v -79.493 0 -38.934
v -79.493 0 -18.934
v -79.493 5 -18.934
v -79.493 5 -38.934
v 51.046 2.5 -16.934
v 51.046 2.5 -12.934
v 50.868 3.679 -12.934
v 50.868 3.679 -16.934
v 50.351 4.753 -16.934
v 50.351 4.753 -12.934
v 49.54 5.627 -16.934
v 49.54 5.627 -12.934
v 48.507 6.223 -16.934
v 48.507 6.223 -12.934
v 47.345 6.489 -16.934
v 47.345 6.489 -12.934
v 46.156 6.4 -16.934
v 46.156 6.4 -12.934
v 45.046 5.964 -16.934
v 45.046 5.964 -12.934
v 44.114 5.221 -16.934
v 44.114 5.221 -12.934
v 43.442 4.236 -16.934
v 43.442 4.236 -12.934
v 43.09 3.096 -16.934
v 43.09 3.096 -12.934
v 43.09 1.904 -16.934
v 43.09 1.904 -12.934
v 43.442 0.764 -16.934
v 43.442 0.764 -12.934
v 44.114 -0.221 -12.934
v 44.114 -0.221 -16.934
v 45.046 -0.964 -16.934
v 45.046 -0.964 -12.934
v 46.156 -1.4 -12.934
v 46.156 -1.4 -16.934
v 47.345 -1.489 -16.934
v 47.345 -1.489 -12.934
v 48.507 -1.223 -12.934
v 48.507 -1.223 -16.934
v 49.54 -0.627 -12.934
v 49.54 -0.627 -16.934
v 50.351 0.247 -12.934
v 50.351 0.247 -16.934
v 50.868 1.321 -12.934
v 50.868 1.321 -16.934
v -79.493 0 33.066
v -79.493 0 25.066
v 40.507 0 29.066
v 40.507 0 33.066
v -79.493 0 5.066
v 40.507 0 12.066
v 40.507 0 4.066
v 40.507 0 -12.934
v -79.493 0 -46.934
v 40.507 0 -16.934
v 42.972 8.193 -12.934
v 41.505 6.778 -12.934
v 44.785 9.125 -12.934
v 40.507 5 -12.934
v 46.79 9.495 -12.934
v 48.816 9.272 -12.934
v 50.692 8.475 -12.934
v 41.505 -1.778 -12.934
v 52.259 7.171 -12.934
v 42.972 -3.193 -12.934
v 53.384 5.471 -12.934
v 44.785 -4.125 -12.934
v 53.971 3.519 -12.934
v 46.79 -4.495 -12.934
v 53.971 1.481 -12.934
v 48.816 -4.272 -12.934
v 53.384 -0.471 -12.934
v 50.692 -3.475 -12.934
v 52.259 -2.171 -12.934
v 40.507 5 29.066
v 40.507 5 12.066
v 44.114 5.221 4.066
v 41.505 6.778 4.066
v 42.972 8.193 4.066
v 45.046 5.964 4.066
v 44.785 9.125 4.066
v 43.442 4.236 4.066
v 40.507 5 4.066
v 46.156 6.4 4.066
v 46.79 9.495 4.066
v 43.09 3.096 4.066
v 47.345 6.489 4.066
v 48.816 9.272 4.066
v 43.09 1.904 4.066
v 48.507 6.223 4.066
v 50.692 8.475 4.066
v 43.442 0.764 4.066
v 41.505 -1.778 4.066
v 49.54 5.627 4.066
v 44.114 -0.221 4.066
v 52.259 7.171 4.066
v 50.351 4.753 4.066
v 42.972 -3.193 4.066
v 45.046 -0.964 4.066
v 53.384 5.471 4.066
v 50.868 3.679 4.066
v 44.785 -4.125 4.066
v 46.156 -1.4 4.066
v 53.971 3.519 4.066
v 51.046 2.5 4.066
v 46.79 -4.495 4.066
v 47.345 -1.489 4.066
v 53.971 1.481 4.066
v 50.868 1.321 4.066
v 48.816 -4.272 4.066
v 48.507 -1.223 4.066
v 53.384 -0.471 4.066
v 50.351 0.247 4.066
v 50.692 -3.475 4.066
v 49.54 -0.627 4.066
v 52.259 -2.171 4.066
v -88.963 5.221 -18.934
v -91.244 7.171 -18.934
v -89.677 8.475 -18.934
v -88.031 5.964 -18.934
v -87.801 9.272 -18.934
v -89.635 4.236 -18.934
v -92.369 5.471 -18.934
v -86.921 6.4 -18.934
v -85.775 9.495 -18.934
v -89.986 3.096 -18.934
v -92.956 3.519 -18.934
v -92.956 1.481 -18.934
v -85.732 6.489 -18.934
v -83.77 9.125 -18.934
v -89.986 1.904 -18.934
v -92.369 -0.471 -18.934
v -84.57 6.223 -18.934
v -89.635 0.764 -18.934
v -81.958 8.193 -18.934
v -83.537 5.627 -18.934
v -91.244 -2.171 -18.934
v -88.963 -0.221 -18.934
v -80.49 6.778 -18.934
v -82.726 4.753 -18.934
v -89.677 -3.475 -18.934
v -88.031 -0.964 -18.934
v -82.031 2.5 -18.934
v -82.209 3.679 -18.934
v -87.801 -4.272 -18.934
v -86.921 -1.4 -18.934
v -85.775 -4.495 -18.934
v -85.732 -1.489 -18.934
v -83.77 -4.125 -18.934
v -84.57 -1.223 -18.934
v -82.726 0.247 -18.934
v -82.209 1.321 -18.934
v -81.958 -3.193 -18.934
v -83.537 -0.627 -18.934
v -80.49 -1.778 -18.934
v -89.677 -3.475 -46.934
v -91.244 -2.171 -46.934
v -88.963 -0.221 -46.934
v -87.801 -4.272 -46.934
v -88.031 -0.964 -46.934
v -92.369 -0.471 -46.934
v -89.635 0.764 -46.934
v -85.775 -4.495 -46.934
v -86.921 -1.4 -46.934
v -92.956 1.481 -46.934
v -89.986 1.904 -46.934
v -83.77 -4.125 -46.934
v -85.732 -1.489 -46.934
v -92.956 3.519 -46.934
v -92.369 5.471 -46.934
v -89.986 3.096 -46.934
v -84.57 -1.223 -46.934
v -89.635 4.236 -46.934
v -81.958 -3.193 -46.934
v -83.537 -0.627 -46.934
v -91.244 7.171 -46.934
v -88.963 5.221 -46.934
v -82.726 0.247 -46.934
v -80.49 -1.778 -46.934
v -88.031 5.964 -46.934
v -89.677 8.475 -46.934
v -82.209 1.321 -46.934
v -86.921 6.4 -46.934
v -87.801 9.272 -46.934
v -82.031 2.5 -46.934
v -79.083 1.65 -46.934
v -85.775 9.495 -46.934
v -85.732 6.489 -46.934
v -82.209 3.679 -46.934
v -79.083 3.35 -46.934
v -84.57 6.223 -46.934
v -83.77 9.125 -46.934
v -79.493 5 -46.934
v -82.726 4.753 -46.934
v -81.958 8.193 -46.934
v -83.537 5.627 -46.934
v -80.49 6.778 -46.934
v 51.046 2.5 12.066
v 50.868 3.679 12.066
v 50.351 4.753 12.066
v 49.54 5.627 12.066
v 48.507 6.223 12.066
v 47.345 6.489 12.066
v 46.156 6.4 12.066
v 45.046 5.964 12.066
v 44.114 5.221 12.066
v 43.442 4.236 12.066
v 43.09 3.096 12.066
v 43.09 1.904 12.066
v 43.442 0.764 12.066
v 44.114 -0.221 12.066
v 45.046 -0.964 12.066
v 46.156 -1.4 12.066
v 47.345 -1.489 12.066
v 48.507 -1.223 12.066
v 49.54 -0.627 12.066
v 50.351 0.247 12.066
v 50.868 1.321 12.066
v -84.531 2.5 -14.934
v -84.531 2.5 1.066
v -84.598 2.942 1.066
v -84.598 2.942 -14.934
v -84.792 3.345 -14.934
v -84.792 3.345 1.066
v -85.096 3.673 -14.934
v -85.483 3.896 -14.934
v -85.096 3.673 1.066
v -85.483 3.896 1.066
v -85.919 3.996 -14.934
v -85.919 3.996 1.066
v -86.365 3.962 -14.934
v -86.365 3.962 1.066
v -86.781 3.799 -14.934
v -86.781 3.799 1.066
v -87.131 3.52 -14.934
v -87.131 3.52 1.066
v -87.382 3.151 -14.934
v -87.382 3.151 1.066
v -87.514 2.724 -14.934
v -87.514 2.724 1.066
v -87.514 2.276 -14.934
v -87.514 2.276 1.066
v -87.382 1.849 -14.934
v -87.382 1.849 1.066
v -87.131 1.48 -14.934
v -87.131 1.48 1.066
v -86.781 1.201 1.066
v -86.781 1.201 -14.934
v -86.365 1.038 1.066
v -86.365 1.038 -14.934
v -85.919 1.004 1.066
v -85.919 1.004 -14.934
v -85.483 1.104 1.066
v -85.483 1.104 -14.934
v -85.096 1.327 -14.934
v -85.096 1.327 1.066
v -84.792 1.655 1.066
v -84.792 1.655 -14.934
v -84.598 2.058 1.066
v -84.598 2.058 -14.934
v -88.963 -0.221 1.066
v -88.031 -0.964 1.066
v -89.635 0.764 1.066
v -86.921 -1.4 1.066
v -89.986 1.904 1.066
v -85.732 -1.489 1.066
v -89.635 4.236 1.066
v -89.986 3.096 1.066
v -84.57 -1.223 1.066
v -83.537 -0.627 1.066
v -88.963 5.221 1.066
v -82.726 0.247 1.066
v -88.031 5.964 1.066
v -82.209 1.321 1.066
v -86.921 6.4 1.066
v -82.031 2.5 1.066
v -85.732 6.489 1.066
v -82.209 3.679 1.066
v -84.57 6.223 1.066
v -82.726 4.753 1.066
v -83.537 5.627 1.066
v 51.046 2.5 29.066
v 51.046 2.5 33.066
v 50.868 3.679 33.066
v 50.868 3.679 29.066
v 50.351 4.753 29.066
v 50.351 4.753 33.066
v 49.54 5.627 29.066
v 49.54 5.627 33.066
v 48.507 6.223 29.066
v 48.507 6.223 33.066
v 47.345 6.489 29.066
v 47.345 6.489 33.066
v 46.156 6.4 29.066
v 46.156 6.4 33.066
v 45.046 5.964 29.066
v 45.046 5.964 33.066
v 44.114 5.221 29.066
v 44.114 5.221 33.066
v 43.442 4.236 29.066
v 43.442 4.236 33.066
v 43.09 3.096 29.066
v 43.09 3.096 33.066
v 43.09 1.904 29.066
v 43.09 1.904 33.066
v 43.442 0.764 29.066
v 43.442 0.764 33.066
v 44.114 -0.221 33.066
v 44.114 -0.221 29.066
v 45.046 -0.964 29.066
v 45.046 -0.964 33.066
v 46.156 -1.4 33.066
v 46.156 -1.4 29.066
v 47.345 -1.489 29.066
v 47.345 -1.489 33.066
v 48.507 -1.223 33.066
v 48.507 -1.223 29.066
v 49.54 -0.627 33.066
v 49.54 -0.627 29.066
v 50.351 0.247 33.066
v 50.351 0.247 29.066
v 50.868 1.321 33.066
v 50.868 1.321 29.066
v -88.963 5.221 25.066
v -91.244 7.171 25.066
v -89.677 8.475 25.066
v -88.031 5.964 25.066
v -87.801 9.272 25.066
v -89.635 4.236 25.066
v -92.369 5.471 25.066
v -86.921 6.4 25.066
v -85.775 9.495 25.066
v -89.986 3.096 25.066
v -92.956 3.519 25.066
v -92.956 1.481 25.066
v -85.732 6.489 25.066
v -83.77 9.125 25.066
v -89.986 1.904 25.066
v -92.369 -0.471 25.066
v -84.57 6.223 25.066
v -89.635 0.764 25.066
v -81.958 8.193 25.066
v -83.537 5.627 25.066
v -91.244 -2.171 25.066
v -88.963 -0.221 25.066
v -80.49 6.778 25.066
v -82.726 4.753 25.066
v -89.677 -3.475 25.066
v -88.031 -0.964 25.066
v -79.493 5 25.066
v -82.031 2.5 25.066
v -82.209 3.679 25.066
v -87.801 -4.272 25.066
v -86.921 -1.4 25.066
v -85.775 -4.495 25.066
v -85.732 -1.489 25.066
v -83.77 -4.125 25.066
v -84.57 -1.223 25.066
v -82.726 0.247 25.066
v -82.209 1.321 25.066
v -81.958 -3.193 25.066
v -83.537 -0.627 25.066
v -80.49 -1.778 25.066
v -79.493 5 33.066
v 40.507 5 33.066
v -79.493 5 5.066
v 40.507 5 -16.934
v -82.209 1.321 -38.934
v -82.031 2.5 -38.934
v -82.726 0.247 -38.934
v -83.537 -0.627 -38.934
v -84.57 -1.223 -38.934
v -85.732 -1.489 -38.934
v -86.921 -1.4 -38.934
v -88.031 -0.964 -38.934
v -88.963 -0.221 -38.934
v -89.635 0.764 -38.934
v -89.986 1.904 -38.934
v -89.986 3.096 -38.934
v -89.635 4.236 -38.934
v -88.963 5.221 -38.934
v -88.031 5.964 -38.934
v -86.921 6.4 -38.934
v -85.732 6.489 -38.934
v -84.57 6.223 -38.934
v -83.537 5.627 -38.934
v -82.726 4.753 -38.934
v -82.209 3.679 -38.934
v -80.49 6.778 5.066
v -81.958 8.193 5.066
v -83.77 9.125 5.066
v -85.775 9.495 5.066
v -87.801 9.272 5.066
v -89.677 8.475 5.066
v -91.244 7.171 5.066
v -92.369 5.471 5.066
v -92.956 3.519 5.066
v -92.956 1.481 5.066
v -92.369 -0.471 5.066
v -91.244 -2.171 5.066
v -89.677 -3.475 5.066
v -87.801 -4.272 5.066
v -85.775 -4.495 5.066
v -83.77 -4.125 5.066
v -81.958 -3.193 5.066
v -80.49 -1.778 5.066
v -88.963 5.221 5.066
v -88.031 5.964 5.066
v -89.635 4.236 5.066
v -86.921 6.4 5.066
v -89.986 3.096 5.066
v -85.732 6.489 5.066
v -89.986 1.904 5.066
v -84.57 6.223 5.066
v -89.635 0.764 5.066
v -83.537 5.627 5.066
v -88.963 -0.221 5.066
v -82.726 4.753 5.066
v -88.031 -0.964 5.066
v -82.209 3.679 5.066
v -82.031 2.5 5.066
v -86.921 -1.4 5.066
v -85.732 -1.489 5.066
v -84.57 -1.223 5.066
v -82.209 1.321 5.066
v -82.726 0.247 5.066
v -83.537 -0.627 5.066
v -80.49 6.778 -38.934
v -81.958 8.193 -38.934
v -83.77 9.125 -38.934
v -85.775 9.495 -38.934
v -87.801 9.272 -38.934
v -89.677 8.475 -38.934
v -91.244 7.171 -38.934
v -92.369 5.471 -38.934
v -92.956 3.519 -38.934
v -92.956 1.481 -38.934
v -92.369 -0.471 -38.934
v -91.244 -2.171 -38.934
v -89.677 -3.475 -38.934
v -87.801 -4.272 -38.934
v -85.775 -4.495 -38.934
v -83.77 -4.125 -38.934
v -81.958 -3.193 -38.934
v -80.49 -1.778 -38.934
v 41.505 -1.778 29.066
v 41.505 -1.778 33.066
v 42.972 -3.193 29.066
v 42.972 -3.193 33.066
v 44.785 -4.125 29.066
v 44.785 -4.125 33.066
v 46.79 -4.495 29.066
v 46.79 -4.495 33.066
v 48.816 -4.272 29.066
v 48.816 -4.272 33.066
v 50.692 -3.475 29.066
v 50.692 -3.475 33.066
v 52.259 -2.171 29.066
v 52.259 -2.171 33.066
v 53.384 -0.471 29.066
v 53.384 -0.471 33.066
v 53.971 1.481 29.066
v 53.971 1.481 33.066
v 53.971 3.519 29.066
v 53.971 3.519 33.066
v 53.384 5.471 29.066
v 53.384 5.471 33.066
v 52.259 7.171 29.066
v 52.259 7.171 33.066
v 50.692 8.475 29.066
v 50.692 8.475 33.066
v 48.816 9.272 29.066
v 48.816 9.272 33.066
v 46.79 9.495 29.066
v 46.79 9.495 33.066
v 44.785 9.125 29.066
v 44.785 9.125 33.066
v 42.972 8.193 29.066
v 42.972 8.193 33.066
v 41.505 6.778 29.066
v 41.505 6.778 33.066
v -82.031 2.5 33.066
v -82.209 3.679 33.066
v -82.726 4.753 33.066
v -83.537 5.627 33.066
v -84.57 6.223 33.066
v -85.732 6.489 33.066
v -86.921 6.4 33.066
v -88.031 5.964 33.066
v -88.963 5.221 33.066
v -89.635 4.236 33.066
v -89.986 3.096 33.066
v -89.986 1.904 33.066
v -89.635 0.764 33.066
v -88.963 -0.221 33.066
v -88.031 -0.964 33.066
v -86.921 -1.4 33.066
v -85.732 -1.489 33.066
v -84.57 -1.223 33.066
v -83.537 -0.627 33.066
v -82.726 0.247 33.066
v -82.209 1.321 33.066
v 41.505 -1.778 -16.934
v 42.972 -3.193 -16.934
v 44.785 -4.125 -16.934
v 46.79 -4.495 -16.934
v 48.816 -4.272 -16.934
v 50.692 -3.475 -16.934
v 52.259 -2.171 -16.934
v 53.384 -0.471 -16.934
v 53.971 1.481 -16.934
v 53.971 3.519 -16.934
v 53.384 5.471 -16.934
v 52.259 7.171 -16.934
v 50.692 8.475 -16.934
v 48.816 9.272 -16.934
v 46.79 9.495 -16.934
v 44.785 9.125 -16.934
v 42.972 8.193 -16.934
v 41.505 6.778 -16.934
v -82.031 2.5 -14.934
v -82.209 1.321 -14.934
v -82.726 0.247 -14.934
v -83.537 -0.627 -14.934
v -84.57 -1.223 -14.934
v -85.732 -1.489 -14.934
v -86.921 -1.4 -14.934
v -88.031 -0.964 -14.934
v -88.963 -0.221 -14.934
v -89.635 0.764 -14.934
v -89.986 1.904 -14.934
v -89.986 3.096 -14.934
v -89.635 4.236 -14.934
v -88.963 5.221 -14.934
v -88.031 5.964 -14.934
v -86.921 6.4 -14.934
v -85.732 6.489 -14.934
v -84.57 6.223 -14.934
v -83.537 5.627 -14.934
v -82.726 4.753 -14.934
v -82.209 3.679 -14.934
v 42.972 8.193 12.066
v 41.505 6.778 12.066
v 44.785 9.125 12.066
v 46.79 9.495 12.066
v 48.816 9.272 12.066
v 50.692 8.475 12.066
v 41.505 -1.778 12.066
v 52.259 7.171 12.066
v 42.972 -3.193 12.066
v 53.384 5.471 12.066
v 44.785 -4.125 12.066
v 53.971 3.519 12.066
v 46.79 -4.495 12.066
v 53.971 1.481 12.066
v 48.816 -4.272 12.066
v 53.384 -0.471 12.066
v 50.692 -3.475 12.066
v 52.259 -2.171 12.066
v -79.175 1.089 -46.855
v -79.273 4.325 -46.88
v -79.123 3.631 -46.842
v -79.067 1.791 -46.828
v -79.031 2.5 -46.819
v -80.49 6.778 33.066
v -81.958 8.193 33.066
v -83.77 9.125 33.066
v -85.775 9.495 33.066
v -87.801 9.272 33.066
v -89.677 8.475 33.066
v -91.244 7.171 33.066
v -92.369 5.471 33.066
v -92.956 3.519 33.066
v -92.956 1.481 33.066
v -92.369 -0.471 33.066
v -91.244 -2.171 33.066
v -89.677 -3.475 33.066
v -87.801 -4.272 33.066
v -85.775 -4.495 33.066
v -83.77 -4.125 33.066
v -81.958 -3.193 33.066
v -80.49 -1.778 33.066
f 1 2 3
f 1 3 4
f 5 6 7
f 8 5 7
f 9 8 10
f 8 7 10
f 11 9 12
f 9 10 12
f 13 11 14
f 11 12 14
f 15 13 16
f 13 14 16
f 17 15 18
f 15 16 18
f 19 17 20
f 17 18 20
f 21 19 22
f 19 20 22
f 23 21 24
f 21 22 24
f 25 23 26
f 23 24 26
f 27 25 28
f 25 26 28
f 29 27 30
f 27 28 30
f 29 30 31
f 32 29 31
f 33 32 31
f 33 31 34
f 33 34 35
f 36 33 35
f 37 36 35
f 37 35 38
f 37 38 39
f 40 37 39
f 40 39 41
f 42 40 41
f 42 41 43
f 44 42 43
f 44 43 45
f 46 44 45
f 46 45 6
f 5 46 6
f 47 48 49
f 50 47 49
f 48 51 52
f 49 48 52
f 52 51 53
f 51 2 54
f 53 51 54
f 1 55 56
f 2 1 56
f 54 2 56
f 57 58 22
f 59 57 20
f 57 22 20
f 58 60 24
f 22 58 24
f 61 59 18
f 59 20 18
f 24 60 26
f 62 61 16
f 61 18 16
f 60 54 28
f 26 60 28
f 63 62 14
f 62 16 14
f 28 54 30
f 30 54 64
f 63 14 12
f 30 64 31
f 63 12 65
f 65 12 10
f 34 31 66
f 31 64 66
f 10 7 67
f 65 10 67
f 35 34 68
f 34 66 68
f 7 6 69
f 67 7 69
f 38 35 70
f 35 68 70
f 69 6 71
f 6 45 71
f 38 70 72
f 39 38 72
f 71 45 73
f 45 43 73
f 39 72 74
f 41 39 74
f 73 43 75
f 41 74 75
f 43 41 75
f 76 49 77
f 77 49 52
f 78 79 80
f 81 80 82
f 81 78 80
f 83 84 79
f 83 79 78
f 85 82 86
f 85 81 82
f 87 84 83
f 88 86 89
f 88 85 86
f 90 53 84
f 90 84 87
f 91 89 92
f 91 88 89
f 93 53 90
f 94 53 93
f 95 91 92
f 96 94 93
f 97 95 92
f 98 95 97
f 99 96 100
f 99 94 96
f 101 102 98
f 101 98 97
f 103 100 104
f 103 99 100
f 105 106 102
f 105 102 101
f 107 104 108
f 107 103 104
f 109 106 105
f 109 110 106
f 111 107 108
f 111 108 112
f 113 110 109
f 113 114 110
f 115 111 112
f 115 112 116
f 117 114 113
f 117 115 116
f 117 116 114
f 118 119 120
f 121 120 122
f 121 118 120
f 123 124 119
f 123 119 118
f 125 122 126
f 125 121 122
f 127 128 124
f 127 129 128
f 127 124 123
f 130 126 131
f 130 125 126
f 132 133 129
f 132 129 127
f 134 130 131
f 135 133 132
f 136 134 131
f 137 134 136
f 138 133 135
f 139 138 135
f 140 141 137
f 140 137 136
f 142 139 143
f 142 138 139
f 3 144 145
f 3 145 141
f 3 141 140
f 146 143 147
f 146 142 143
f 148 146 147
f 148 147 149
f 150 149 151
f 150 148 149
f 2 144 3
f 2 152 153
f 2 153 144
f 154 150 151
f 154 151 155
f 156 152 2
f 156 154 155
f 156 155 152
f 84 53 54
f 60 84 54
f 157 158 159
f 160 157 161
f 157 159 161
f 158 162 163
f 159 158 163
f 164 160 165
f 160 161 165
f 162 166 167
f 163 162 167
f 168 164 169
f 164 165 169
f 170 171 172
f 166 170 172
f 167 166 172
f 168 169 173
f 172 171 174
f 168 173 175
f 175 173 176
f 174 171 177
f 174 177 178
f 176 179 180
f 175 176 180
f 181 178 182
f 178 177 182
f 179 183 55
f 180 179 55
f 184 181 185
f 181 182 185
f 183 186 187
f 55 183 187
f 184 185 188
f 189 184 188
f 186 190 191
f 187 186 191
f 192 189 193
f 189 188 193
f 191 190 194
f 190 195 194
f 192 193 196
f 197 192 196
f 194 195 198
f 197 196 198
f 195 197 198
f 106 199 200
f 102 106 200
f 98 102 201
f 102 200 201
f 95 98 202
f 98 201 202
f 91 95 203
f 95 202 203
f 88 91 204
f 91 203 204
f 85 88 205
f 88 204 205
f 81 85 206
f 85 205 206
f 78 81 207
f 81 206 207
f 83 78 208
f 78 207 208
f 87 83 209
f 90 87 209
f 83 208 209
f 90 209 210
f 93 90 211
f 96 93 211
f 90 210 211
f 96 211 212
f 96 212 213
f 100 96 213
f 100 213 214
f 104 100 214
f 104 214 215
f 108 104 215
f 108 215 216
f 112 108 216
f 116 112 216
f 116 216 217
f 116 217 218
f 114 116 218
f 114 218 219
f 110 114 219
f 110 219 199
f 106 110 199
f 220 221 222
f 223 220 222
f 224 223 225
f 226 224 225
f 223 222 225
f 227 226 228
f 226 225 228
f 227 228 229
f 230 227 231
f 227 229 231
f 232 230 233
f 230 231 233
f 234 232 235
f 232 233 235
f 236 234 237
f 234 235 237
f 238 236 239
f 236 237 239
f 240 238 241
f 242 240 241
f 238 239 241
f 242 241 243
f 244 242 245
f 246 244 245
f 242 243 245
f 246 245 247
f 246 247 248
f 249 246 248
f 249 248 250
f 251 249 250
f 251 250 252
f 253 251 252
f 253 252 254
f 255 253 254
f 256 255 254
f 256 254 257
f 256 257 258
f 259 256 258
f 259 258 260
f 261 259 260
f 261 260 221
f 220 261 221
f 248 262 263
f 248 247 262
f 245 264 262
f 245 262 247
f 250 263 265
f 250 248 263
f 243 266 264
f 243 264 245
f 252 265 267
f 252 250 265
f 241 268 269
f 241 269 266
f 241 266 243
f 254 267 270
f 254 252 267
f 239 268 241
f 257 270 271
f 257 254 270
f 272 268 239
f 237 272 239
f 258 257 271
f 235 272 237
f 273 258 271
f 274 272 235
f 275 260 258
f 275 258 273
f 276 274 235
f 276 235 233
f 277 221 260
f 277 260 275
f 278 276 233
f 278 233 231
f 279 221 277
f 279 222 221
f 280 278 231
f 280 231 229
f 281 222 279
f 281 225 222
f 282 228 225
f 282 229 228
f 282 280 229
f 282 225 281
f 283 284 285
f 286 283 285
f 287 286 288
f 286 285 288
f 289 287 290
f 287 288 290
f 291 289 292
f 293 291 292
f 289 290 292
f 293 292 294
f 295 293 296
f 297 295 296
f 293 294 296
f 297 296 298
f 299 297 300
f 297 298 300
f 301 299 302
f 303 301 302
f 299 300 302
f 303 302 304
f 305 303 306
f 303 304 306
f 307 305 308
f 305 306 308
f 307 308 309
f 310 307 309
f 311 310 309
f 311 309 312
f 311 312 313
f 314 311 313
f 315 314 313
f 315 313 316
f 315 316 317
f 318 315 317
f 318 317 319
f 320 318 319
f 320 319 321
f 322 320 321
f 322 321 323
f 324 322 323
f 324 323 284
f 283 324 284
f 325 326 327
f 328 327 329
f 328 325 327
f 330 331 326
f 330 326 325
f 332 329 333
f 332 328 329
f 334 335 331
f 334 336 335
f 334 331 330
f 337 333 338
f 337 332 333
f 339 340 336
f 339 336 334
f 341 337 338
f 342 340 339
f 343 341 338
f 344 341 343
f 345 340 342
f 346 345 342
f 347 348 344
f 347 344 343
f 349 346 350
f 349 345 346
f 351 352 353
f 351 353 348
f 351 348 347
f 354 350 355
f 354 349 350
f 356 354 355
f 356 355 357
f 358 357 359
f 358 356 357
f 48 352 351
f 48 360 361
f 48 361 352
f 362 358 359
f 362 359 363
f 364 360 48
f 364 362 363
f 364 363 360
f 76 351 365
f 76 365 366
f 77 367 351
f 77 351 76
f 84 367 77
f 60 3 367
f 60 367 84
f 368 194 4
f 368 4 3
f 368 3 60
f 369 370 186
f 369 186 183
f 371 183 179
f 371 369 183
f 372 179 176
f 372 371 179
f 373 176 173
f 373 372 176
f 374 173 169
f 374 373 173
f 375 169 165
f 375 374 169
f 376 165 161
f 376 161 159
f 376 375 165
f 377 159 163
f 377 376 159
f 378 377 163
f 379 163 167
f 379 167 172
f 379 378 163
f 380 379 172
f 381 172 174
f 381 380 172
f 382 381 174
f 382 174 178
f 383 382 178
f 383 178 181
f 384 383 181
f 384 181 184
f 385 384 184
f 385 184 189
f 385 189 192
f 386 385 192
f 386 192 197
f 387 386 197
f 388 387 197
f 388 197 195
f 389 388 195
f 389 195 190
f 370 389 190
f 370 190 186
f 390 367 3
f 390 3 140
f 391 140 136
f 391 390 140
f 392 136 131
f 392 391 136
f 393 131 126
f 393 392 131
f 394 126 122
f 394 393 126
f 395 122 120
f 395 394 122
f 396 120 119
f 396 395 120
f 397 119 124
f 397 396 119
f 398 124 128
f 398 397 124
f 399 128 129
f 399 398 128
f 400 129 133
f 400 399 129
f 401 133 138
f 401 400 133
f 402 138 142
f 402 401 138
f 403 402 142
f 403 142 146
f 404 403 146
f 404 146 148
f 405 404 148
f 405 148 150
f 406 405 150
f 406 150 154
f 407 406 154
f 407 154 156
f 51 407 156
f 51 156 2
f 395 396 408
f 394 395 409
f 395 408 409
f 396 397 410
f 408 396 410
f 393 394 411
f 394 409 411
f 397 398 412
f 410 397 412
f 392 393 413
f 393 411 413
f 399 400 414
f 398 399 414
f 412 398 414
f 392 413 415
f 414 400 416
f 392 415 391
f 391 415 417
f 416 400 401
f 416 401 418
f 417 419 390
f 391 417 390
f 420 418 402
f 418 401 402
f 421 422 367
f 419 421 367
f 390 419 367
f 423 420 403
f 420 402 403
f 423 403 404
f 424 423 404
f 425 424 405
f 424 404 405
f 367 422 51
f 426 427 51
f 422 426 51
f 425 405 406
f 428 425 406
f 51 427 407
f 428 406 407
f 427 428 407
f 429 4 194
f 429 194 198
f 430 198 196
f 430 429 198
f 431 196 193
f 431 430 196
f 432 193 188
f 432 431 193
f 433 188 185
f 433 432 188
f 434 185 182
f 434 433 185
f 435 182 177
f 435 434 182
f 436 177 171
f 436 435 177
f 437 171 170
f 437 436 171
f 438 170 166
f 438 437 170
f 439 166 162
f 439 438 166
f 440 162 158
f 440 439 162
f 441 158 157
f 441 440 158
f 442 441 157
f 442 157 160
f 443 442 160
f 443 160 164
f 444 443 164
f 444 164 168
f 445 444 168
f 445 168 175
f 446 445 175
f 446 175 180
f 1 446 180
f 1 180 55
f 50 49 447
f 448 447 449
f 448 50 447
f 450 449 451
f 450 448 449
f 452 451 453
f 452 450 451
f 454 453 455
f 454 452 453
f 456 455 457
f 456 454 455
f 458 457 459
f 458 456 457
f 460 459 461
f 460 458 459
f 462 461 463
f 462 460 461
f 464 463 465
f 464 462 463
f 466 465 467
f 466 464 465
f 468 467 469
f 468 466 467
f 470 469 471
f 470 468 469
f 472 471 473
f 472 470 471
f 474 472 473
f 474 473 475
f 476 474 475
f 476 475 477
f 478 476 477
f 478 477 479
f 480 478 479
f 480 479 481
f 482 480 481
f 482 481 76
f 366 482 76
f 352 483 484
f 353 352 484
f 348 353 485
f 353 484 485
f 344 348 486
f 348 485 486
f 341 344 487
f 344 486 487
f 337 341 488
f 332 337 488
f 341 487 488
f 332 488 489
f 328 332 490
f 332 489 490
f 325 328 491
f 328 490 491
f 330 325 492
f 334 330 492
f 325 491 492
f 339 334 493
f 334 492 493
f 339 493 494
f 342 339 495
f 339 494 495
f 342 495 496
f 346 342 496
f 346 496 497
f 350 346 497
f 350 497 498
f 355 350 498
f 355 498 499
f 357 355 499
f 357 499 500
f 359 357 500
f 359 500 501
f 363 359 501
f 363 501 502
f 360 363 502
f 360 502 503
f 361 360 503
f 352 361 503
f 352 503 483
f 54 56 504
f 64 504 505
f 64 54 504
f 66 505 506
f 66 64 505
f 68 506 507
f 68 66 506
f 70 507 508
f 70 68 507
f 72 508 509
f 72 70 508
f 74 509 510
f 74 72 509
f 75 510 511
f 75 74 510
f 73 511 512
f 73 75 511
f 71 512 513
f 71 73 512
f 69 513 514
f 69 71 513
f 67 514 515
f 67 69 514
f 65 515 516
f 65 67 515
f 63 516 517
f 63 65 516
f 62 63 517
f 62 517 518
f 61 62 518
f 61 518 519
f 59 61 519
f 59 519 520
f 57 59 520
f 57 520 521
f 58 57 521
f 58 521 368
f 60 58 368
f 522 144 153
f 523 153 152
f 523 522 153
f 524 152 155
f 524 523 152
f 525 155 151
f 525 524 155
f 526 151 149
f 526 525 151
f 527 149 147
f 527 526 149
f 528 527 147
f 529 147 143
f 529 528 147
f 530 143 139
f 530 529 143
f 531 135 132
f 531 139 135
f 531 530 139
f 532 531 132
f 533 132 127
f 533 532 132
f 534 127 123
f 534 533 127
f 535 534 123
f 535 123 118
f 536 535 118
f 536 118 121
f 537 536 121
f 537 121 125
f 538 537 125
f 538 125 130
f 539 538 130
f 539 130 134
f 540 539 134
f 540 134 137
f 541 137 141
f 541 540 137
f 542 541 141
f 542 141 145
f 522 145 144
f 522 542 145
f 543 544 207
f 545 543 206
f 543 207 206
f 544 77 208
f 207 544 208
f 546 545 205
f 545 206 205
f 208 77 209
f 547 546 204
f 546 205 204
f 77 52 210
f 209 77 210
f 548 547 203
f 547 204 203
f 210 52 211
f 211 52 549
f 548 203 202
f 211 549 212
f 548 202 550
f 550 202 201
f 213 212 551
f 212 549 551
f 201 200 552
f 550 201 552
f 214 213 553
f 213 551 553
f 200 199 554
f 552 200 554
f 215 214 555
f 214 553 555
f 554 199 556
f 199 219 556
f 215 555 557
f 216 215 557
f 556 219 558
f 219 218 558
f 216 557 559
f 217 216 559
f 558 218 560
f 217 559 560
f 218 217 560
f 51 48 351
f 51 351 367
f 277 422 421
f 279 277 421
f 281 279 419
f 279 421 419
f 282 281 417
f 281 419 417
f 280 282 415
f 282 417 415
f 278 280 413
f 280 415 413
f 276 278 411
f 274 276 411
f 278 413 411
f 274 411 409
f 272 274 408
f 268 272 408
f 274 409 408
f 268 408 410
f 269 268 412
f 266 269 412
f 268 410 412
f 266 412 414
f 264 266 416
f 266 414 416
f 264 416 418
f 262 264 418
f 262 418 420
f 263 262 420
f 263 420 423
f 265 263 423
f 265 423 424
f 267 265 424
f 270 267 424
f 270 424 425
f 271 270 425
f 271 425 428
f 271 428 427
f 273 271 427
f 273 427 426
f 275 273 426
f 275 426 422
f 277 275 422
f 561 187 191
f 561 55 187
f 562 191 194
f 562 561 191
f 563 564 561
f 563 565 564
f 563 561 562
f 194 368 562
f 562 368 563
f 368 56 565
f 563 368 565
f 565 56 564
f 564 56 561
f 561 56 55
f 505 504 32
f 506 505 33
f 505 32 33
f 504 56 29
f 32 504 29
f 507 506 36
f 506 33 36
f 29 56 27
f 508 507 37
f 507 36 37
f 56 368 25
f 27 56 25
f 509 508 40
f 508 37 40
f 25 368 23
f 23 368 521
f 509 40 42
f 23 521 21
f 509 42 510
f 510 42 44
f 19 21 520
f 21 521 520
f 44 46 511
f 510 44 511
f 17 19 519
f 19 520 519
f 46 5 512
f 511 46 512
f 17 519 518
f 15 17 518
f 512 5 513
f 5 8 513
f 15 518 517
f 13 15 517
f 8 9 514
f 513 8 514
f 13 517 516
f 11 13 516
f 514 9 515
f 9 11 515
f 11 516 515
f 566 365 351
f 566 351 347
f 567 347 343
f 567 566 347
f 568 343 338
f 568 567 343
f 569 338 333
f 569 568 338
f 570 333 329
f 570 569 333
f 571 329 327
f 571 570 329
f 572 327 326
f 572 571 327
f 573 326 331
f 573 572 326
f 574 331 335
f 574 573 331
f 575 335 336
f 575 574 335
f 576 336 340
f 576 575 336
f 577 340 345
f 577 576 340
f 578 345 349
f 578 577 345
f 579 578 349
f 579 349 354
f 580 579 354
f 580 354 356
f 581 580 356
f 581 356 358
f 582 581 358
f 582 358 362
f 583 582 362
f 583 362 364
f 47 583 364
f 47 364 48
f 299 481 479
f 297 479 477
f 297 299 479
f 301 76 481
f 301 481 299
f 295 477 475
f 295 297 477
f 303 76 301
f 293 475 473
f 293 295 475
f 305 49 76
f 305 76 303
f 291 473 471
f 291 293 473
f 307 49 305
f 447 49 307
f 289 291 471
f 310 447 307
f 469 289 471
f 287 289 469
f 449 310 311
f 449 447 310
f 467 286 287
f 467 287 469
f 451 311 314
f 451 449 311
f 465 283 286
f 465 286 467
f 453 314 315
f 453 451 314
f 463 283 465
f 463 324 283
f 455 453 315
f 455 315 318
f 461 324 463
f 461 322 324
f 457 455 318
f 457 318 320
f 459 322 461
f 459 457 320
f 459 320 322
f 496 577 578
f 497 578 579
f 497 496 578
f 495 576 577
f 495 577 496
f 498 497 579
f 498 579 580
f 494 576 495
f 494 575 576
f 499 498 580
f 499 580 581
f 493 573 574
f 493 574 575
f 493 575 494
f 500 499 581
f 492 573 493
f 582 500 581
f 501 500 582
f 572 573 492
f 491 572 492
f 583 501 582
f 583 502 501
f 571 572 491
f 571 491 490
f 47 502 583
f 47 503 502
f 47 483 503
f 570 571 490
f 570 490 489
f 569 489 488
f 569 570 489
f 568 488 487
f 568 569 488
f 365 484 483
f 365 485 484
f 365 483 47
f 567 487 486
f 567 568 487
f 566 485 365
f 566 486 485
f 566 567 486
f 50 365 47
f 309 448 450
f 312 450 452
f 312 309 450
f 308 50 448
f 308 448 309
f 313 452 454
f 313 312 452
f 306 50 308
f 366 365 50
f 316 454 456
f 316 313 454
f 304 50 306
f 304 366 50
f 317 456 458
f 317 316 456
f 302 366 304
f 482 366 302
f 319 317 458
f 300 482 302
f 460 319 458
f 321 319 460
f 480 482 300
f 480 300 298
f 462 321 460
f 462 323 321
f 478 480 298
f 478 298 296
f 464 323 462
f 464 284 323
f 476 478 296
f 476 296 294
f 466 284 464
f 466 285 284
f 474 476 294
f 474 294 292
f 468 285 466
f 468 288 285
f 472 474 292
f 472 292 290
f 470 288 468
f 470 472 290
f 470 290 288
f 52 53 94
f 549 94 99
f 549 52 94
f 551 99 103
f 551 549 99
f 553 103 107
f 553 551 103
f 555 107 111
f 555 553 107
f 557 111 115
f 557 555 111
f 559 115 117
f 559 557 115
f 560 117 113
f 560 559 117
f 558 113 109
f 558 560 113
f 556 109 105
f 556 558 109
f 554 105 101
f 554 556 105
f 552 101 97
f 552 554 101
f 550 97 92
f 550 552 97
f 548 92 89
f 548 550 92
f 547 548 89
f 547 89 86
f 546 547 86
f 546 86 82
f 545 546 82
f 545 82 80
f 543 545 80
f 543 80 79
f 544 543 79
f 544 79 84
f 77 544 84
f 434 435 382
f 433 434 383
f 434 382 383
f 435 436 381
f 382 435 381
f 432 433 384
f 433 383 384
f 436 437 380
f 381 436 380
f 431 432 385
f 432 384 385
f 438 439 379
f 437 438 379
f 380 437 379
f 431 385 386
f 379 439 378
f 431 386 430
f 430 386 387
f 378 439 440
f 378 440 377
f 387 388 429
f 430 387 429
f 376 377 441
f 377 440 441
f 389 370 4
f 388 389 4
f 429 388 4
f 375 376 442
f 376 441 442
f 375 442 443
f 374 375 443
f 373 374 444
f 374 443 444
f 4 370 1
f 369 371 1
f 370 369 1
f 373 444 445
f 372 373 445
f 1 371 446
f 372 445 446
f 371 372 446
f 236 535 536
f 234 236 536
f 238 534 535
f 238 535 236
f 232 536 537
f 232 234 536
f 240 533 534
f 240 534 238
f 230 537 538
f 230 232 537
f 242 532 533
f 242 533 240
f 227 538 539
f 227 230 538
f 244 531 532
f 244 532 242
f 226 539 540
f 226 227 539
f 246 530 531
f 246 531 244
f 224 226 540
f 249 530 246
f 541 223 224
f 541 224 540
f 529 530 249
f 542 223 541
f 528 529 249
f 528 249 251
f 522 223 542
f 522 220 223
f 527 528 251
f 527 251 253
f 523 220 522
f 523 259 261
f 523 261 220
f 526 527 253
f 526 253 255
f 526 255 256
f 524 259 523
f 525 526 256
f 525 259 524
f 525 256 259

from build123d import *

# Parameters (mm, degrees)
EXTRUDE_1_DEPTH          = 5
SKETCH_3_R               = 7
SKETCH_3_R_2             = 1.5
EXTRUDE_2_DEPTH          = 80
CUT_EXTRUDE_1_DEPTH      = 80
CUT_EXTRUDE_1_DEPTH_BACK = 80
SKETCH_4_W               = 13.538348415
SKETCH_4_H               = 20
SKETCH_5_R               = 7
SKETCH_5_R_2             = 4
EXTRUDE_3_DEPTH          = 50
CUT_EXTRUDE_2_DEPTH      = 50
CUT_EXTRUDE_2_DEPTH_BACK = 50
SKETCH_6_W               = 13.538348415
SKETCH_6_H               = 17
SKETCH_7_R               = 4
CUT_EXTRUDE_3_DEPTH      = 32
CUT_EXTRUDE_START        = -32
SKETCH_8_R               = 4
CUT_EXTRUDE_4_DEPTH      = 32


with BuildPart() as part:
    # 草图1 → 凸台-拉伸1 (new body)
    with BuildSketch(Plane(origin=(0, 0, 0), x_dir=(1, 0, 0), z_dir=(0, 1, 0))):
        Polygon((-79.492600423, 46.934460888), (-79.492600423, -33.065539112), (40.507399577, -33.065539112), (40.507399577, 16.934460888), align=None)
    extrude(amount=EXTRUDE_1_DEPTH)

    # 草图3 → 凸台-拉伸2 (add)
    with BuildSketch(Plane.XY.offset(33.065539112)):
        with Locations((-86.030948838, 2.5)):
            Circle(SKETCH_3_R)
        with Locations((-86.030948838, 2.5)):
            Circle(SKETCH_3_R_2, mode=Mode.SUBTRACT)
    extrude(amount=-EXTRUDE_2_DEPTH)

    # 草图4 → 切除-拉伸1 (cut, two sides: drawn at the far end of the back side and taken through both)
    with BuildSketch(Plane(origin=(0, 5, 0), x_dir=(1, 0, 0), z_dir=(0, 1, 0)).offset(-CUT_EXTRUDE_1_DEPTH_BACK)):
        with Locations((-86.26177463, 28.934460888)):
            Rectangle(SKETCH_4_W, SKETCH_4_H)
        with Locations((-86.26177463, -15.065539112)):
            Rectangle(SKETCH_4_W, SKETCH_4_H)
    extrude(amount=CUT_EXTRUDE_1_DEPTH + CUT_EXTRUDE_1_DEPTH_BACK, mode=Mode.SUBTRACT)

    # 草图5 → 凸台-拉伸3 (add)
    with BuildSketch(Plane.XY.offset(33.065539112)):
        with Locations((47.045747992, 2.5)):
            Circle(SKETCH_5_R)
        with Locations((47.045747992, 2.5)):
            Circle(SKETCH_5_R_2, mode=Mode.SUBTRACT)
    extrude(amount=-EXTRUDE_3_DEPTH)

    # 草图6 → 切除-拉伸2 (cut, two sides: drawn at the far end of the back side and taken through both)
    with BuildSketch(Plane(origin=(0, 5, 0), x_dir=(1, 0, 0), z_dir=(0, 1, 0)).offset(-CUT_EXTRUDE_2_DEPTH_BACK)):
        with Locations((47.276573785, 4.434460888)):
            Rectangle(SKETCH_6_W, SKETCH_6_H)
        with Locations((47.276573785, -20.565539112)):
            Rectangle(SKETCH_6_W, SKETCH_6_H)
    extrude(amount=CUT_EXTRUDE_2_DEPTH + CUT_EXTRUDE_2_DEPTH_BACK, mode=Mode.SUBTRACT)

    # 草图7 → 切除-拉伸3 (cut)
    with BuildSketch(Plane.XY.offset(33.065539112)):
        with Locations((-86.030948838, 2.5)):
            Circle(SKETCH_7_R)
    extrude(amount=-CUT_EXTRUDE_3_DEPTH, mode=Mode.SUBTRACT)

    # 草图8 → 切除-拉伸4 (cut)
    with BuildSketch(Plane(origin=(0, 0, -46.934460888), x_dir=(-1, 0, 0), z_dir=(0, 0, -1)).offset(CUT_EXTRUDE_START)):
        with Locations((86.030948838, 2.5)):
            Circle(SKETCH_8_R)
    extrude(amount=CUT_EXTRUDE_4_DEPTH, mode=Mode.SUBTRACT)


solid = part.part
